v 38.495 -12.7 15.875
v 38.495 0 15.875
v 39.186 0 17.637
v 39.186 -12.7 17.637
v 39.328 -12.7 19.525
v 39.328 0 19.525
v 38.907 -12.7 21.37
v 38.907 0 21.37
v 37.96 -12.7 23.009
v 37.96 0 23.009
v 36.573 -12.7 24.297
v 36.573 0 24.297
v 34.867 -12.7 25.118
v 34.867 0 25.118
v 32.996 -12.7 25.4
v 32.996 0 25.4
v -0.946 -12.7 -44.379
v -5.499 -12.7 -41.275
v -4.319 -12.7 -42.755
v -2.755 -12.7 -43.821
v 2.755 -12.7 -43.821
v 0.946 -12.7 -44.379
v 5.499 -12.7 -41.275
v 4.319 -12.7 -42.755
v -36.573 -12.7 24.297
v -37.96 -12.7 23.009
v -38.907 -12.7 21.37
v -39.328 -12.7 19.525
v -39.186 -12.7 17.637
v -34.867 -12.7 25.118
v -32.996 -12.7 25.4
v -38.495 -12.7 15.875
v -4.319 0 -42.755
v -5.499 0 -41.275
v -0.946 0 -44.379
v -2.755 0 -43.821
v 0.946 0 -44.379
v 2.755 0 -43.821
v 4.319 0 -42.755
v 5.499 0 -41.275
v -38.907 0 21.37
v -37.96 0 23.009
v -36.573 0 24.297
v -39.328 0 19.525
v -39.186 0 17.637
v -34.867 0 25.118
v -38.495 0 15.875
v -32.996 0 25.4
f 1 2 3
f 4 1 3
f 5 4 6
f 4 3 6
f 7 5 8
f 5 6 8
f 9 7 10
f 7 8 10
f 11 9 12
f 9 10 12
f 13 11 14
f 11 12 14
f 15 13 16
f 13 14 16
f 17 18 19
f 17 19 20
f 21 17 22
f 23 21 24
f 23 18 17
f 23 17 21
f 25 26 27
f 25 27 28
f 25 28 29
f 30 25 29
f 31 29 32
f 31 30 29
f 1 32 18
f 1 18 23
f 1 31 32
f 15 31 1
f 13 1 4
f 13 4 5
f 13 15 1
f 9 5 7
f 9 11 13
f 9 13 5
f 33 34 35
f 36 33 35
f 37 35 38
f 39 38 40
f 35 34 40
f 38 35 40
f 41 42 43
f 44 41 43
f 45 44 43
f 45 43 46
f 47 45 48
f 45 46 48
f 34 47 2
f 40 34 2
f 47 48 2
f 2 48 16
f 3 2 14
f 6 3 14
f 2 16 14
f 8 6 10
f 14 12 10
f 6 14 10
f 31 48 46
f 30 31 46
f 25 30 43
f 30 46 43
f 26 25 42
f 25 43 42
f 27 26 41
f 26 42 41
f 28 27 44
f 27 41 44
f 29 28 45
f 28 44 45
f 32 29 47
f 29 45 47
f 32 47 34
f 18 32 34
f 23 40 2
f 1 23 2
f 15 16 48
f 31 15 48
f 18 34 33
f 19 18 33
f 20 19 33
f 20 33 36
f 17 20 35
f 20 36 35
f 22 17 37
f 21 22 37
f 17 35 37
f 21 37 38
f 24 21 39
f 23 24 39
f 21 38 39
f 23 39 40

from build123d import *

# Parameters (mm, degrees)
F1_DEPTH = 12.7


with BuildPart() as f1:
    # F0 (on Front) → F1 (new body)
    with BuildSketch(Plane.XZ):
        with BuildLine():
            Line((32.995568, 25.4), (-32.995568, 25.4))
            ThreePointArc((-32.995568, 25.4), (-38.494829, 22.225), (-38.494829, 15.875))
            Line((-38.494829, 15.875), (-5.499261, -41.275))
            ThreePointArc((-5.499261, -41.275), (0, -44.45), (5.499261, -41.275))
            Line((5.499261, -41.275), (38.494829, 15.875))
            ThreePointArc((38.494829, 15.875), (38.494829, 22.225), (32.995568, 25.4))
        make_face()
    extrude(amount=F1_DEPTH)


solid = f1.part
